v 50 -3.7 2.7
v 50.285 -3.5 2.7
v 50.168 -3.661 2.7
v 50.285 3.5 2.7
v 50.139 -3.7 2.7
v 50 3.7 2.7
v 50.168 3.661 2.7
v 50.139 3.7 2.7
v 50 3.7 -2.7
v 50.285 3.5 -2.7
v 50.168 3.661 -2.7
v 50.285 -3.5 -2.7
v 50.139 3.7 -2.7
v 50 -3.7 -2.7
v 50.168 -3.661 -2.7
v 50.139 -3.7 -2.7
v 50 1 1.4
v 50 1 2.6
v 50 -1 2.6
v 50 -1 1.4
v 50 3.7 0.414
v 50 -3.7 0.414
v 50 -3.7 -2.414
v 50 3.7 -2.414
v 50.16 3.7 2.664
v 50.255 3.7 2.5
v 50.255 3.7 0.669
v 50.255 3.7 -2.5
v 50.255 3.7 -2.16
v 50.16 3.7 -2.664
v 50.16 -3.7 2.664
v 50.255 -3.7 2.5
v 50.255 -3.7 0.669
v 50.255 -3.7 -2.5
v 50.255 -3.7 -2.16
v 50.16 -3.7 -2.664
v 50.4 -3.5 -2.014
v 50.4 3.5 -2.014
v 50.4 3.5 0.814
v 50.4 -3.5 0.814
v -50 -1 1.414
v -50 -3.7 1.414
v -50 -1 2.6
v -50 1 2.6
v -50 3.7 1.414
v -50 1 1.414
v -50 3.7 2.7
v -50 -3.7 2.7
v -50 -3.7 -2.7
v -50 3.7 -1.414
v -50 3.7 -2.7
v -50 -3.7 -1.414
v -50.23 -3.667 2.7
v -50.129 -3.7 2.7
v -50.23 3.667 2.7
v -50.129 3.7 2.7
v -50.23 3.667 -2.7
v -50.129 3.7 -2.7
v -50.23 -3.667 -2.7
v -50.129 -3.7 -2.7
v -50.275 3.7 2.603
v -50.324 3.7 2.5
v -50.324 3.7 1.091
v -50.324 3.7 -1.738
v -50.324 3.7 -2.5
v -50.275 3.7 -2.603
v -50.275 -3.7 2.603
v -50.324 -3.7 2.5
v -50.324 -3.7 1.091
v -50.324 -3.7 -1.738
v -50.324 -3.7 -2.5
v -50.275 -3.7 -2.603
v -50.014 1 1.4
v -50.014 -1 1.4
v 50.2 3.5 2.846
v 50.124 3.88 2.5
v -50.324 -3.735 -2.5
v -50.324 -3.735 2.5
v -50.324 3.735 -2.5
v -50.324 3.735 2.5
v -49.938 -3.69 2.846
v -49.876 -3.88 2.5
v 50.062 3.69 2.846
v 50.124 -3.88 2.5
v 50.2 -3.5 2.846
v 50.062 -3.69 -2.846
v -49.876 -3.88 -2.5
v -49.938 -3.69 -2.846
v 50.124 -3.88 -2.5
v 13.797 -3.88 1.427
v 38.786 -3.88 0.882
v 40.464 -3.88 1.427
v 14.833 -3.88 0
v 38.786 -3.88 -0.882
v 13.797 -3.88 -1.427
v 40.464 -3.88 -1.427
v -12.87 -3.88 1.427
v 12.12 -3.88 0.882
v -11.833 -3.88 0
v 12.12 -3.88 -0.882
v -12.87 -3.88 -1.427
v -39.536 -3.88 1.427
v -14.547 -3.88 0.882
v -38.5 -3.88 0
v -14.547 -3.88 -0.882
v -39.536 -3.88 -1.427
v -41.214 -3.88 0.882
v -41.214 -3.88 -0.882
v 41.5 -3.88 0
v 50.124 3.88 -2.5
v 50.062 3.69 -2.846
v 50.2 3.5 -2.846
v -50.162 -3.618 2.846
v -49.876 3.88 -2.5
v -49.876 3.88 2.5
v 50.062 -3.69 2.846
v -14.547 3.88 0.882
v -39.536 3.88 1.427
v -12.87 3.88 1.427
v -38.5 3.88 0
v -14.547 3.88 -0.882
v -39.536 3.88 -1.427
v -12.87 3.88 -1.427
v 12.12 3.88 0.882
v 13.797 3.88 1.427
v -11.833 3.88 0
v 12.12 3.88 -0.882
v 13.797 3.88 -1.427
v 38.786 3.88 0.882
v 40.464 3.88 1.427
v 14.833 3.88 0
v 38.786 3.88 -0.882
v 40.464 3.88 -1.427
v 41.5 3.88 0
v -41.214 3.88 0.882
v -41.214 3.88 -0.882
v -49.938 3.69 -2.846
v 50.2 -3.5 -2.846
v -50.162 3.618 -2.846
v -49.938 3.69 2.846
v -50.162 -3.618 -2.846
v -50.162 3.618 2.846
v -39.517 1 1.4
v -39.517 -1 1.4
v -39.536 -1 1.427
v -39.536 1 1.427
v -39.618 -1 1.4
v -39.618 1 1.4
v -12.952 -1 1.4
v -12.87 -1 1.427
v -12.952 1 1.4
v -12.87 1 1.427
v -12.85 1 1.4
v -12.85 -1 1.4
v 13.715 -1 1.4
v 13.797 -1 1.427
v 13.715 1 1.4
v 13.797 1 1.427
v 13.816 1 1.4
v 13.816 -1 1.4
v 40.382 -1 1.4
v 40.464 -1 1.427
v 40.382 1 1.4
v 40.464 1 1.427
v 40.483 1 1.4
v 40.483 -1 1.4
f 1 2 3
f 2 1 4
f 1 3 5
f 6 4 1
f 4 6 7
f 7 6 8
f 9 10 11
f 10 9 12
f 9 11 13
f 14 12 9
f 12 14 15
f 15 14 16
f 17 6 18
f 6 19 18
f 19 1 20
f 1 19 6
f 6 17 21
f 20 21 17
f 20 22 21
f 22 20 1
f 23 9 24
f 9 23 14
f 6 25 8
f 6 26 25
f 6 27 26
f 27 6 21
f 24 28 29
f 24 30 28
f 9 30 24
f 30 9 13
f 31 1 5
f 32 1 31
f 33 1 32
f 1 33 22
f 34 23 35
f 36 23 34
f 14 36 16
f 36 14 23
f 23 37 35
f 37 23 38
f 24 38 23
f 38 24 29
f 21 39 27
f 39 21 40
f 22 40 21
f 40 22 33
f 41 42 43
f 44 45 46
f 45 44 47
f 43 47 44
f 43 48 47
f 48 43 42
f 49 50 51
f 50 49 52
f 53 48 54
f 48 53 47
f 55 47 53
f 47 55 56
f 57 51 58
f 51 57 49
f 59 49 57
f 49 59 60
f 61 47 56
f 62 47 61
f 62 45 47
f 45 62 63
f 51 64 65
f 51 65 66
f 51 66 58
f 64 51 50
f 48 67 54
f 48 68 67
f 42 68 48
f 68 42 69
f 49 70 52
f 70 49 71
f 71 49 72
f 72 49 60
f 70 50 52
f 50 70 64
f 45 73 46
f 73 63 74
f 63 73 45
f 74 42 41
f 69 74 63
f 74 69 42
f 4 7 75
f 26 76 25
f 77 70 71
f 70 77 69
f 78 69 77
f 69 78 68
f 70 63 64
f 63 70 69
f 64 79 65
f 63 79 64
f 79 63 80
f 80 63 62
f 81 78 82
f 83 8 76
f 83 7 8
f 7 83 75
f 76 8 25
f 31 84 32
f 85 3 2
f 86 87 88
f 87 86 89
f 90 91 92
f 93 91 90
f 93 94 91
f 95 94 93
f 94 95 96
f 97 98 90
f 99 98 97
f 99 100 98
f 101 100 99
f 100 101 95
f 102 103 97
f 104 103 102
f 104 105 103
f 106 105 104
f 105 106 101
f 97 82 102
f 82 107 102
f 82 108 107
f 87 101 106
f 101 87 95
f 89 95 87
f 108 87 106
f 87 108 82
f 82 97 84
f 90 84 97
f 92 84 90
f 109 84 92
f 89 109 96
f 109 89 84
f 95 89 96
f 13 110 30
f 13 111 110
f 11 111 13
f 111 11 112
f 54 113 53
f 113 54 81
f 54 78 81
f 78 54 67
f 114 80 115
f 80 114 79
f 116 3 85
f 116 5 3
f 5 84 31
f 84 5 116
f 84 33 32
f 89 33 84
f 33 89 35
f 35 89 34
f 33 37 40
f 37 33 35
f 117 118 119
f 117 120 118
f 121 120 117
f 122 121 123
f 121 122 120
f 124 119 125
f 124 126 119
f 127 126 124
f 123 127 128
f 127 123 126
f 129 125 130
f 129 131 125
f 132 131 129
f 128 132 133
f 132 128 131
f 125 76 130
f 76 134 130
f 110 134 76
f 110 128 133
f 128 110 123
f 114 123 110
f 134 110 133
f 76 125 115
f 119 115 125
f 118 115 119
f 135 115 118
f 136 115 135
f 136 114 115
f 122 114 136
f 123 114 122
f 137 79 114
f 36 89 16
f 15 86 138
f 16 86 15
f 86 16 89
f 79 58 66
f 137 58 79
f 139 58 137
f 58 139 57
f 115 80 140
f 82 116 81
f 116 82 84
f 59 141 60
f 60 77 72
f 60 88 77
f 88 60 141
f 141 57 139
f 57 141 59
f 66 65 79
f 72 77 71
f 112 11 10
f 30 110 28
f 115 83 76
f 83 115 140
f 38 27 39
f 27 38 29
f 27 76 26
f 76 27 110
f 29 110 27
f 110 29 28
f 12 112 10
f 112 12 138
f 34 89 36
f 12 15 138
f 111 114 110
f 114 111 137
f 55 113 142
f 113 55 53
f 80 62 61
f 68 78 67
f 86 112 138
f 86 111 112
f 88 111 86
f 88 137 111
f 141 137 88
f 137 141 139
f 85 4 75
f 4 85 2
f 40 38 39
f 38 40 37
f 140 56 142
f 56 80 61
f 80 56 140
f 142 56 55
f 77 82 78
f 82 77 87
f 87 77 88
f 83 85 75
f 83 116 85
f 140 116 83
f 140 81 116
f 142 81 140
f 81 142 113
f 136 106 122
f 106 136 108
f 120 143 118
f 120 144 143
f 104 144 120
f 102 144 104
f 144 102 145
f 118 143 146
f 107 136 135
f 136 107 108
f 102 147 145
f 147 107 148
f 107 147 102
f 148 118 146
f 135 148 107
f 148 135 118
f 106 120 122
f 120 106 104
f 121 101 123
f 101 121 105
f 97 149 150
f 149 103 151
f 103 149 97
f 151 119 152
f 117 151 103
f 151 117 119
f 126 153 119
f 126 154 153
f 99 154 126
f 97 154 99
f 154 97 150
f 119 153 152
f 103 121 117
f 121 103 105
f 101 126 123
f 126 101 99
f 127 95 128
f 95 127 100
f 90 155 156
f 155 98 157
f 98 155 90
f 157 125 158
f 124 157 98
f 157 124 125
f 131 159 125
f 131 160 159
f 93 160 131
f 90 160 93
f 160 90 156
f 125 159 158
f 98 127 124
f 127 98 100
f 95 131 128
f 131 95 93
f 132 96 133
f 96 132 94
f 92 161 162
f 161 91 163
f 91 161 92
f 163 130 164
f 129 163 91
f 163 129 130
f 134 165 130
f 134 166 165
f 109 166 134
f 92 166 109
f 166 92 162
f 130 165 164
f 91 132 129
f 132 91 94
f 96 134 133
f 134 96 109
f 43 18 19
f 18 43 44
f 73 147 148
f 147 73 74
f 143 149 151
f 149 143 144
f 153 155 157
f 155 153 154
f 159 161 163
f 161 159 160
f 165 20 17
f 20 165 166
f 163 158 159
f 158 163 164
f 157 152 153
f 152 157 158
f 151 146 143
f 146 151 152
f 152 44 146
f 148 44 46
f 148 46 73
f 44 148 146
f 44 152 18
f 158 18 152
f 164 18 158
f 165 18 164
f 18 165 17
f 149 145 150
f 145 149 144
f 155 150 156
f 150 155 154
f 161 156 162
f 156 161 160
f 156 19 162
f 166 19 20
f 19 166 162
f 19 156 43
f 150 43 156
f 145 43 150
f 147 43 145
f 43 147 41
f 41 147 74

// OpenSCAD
// Parameters
rail_L = 100.0; //[50.0:200.0:1]
rail_W = 7.0; //[3.5:14.0:0.1]
rail_H = 5.0; //[2.5:10.0:0.1]
edge_fillet_r = 0.4; //[0.2:1.0:0.05]
chamfer_L = 1.0; //[0.5:3.0:0.1]
hole_d = 3.0; //[1.5:4.5:0.1]
hole_count = 4; //[2:8:1]
hole_edge_margin = 10.0; //[5.0:20.0:0.5]
hole_z_from_bottom = 2.5; //[1.0:4.0:0.1]
groove_W = 2.0; //[1.0:4.0:0.1]
groove_D = 1.0; //[0.5:2.5:0.1]
overlap = 1.0; //[0.5:2.0:0.1]
eps = 0.2; //[0.05:0.5:0.05]

// Base Shapes
module rail_body_raw() {
  translate([0, 0, 0])
    cube([rail_L, rail_W, rail_H], center=true);
}

module fillet_sphere() {
  translate([0, 0, 0])
    sphere(r=edge_fillet_r, center=true);
}

module chamfer_wedge_base() {
  translate([0, 0, 0])
    cube([chamfer_L, rail_W + 2*eps, rail_H + 2*eps], center=true);
}

module chamfer_wedge_cut() {
  translate([chamfer_L/2, 0, 0])
    rotate([0, 45, 0])
      cube([2*chamfer_L, rail_W + 4*eps, 2*(rail_H + 4*eps)], center=true);
}

module mount_hole_cyl() {
  translate([0, 0, -rail_H/2 + hole_z_from_bottom])
    rotate([90, 0, 0])
      cylinder(r=hole_d/2, h=rail_W + 4*eps, center=true);
}

module center_groove_box() {
  translate([0, 0, rail_H/2 - groove_D/2])
    cube([rail_L + 2*eps, groove_W, groove_D + eps], center=true);
}

// Operations
module edge_fillets() {
  minkowski() {
    rail_body_raw();
    fillet_sphere();
  }
}

module chamfer_wedge() {
  difference() {
    chamfer_wedge_base();
    chamfer_wedge_cut();
  }
}

module end_chamfers() {
  union() {
    translate([rail_L/2 - chamfer_L/2 + overlap, 0, 0])
      chamfer_wedge();
    translate([-rail_L/2 + chamfer_L/2 - overlap, 0, 0])
      chamfer_wedge();
  }
}

module rail_with_end_chamfers() {
  difference() {
    edge_fillets();
    end_chamfers();
  }
}

module mounting_holes() {
  union() {
    for (i = [0:hole_count-1]) {
      translate([-rail_L/2 + hole_edge_margin + (rail_L - 2*hole_edge_margin) * (i/(hole_count-1)), 0, 0])
        mount_hole_cyl();
    }
  }
}

module rail_with_holes() {
  difference() {
    rail_with_end_chamfers();
    mounting_holes();
  }
}

module center_groove_or_profile_details() {
  difference() {
    rail_with_holes();
    center_groove_box();
  }
}

// Final Output
color("DimGray")
center_groove_or_profile_details();
